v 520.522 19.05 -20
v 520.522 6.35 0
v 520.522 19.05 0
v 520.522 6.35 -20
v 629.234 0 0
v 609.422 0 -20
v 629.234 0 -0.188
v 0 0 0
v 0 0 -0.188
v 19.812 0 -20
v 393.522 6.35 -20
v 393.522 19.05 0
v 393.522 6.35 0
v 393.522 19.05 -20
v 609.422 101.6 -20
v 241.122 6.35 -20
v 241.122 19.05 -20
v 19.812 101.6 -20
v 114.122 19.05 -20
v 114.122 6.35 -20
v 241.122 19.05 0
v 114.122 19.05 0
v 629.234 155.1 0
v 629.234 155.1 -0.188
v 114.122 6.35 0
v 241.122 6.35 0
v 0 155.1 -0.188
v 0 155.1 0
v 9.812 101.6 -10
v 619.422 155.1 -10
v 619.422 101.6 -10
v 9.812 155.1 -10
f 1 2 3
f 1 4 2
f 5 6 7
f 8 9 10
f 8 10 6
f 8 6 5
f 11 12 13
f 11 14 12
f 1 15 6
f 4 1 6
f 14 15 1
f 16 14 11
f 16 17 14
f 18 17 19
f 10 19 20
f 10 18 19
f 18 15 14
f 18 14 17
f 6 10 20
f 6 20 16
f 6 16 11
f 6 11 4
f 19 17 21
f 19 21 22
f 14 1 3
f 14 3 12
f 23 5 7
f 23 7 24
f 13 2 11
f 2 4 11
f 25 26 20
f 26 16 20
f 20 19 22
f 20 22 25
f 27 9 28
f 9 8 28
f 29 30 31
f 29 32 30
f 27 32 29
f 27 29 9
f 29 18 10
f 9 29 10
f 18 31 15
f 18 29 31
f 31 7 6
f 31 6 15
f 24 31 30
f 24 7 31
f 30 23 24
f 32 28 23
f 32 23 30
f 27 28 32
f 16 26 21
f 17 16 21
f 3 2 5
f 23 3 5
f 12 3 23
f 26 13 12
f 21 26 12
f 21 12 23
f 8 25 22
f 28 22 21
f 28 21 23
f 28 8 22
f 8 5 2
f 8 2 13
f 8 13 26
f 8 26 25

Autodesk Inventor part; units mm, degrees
ref_plane "YZ Plane" through (0, 0, 0) normal (1, 0, 0) x (0, 1, 0)
ref_plane "XZ Plane" through (0, 0, 0) normal (0, 1, 0) x (-1, 0, 0)
ref_plane "XY Plane" through (0, 0, 0) normal (0, 0, 1) x (1, 0, 0)
sketch "Sketch1" plane through (0, 0, 0) normal (1, 0, 0) x (0, 1, 0)
  line L0 (0, 0) -> (155.1, 0)
  line L1 (155.1, 0) -> (155.1, -10)
  line L2 (0, -20) -> (0, 0)
  line L3 (155.1, -10) -> (101.6, -10)
  line L4 (101.6, -10) -> (101.6, -20)
  line L5 (101.6, -20) -> (0, -20)
  dimension "d0" = 53.5
  dimension "d1" = 155.1
  dimension "d2" = 10
  dimension "d3" = 10
  dimension "d4" = 20
extrude "Extrusion1" add sketch "Sketch1" along normal blind 629.2342
chamfer "Chamfer1" distance 19.812 angle 45 1 edges at (629.2342, 50.8, -20)
chamfer "Chamfer2" distance 19.812 angle 45 1 edges at (0, 50.8, -20)
sketch "Sketch2" plane through (609.4222, 0, -20) normal (0, 0, -1) x (-1, 0, 0)
  line L0 (589.6102, 0) -> (0, 0) projected
  line L1 (0, 0) -> (0, 6.35)
  line L2 (0, 0) -> (0, 101.6) projected
  line L3 (0, 6.35) -> (88.9, 6.35)
  line L4 (88.9, 6.35) -> (88.9, 26.35)
  line L5 (88.9, 26.35) -> (215.9, 26.35)
  line L6 (215.9, 26.35) -> (215.9, 6.35)
  line L7 (215.9, 6.35) -> (368.3, 6.35)
  line L8 (368.3, 6.35) -> (368.3, 19.05)
  line L9 (368.3, 19.05) -> (495.3, 19.05)
  line L10 (495.3, 19.05) -> (495.3, 6.35)
  line L11 (495.3, 6.35) -> (589.6102, 6.35)
  line L12 (589.6102, 101.6) -> (589.6102, 0) projected
  line L13 (88.9, 6.35) -> (215.9, 6.35)
  line L14 (368.3, 6.35) -> (495.3, 6.35)
  point P0 (609.4222, 0)
  dimension "d13" = 6.35
  dimension "d15" = 88.9
  dimension "d16" = 127
  dimension "d17" = 152.4
  dimension "d18" = 127
  dimension "d20" = 20
  dimension "d21" = 20
  dimension "d22" = 12.7
  dimension "d23" = 12.7
sketch "Sketch3" plane through (609.4222, 0, -20) normal (0, 0, -1) x (-1, 0, 0)
  line L0 (589.6102, 0) -> (0, 0)
  line L1 (0, 0) -> (0, 6.35)
  line L2 (0, 0) -> (0, 101.6)
  line L3 (0, 6.35) -> (88.9, 6.35)
  line L4 (88.9, 6.35) -> (88.9, 19.05)
  line L5 (88.9, 19.05) -> (215.9, 19.05)
  line L6 (215.9, 19.05) -> (215.9, 6.35)
  line L7 (215.9, 6.35) -> (368.3, 6.35)
  line L8 (368.3, 6.35) -> (368.3, 26.35)
  line L9 (368.3, 26.35) -> (495.3, 26.35)
  line L10 (495.3, 26.35) -> (495.3, 6.35)
  line L11 (495.3, 6.35) -> (589.6102, 6.35)
  line L12 (589.6102, 101.6) -> (589.6102, 0)
  line L13 (88.9, 6.35) -> (215.9, 6.35)
  line L14 (368.3, 6.35) -> (495.3, 6.35)
  line L15 (-19.812, 0) -> (0, 0) projected
  line L16 (0, 6.35) -> (0, 0)
  point P0 (609.4222, 0)
  point P1 (609.4222, 0)
  dimension "d24" = 6.35
  dimension "d25" = 88.9
  dimension "d26" = 127
  dimension "d27" = 152.4
  dimension "d28" = 127
  dimension "d29" = 12.7
  dimension "d30" = 12.7
  dimension "d31" = 20
  dimension "d32" = 20
  dimension "d37" = 6.35
extrude "Extrusion2" cut sketch "Sketch3" against normal blind 508 contours L4 L5 L6 L13
extrude "Extrusion3" cut sketch "Sketch2" against normal blind 508 contours L14 L8 L9 L10
properties part number "SkinnySideWidth" material "Wood (Birch)"
